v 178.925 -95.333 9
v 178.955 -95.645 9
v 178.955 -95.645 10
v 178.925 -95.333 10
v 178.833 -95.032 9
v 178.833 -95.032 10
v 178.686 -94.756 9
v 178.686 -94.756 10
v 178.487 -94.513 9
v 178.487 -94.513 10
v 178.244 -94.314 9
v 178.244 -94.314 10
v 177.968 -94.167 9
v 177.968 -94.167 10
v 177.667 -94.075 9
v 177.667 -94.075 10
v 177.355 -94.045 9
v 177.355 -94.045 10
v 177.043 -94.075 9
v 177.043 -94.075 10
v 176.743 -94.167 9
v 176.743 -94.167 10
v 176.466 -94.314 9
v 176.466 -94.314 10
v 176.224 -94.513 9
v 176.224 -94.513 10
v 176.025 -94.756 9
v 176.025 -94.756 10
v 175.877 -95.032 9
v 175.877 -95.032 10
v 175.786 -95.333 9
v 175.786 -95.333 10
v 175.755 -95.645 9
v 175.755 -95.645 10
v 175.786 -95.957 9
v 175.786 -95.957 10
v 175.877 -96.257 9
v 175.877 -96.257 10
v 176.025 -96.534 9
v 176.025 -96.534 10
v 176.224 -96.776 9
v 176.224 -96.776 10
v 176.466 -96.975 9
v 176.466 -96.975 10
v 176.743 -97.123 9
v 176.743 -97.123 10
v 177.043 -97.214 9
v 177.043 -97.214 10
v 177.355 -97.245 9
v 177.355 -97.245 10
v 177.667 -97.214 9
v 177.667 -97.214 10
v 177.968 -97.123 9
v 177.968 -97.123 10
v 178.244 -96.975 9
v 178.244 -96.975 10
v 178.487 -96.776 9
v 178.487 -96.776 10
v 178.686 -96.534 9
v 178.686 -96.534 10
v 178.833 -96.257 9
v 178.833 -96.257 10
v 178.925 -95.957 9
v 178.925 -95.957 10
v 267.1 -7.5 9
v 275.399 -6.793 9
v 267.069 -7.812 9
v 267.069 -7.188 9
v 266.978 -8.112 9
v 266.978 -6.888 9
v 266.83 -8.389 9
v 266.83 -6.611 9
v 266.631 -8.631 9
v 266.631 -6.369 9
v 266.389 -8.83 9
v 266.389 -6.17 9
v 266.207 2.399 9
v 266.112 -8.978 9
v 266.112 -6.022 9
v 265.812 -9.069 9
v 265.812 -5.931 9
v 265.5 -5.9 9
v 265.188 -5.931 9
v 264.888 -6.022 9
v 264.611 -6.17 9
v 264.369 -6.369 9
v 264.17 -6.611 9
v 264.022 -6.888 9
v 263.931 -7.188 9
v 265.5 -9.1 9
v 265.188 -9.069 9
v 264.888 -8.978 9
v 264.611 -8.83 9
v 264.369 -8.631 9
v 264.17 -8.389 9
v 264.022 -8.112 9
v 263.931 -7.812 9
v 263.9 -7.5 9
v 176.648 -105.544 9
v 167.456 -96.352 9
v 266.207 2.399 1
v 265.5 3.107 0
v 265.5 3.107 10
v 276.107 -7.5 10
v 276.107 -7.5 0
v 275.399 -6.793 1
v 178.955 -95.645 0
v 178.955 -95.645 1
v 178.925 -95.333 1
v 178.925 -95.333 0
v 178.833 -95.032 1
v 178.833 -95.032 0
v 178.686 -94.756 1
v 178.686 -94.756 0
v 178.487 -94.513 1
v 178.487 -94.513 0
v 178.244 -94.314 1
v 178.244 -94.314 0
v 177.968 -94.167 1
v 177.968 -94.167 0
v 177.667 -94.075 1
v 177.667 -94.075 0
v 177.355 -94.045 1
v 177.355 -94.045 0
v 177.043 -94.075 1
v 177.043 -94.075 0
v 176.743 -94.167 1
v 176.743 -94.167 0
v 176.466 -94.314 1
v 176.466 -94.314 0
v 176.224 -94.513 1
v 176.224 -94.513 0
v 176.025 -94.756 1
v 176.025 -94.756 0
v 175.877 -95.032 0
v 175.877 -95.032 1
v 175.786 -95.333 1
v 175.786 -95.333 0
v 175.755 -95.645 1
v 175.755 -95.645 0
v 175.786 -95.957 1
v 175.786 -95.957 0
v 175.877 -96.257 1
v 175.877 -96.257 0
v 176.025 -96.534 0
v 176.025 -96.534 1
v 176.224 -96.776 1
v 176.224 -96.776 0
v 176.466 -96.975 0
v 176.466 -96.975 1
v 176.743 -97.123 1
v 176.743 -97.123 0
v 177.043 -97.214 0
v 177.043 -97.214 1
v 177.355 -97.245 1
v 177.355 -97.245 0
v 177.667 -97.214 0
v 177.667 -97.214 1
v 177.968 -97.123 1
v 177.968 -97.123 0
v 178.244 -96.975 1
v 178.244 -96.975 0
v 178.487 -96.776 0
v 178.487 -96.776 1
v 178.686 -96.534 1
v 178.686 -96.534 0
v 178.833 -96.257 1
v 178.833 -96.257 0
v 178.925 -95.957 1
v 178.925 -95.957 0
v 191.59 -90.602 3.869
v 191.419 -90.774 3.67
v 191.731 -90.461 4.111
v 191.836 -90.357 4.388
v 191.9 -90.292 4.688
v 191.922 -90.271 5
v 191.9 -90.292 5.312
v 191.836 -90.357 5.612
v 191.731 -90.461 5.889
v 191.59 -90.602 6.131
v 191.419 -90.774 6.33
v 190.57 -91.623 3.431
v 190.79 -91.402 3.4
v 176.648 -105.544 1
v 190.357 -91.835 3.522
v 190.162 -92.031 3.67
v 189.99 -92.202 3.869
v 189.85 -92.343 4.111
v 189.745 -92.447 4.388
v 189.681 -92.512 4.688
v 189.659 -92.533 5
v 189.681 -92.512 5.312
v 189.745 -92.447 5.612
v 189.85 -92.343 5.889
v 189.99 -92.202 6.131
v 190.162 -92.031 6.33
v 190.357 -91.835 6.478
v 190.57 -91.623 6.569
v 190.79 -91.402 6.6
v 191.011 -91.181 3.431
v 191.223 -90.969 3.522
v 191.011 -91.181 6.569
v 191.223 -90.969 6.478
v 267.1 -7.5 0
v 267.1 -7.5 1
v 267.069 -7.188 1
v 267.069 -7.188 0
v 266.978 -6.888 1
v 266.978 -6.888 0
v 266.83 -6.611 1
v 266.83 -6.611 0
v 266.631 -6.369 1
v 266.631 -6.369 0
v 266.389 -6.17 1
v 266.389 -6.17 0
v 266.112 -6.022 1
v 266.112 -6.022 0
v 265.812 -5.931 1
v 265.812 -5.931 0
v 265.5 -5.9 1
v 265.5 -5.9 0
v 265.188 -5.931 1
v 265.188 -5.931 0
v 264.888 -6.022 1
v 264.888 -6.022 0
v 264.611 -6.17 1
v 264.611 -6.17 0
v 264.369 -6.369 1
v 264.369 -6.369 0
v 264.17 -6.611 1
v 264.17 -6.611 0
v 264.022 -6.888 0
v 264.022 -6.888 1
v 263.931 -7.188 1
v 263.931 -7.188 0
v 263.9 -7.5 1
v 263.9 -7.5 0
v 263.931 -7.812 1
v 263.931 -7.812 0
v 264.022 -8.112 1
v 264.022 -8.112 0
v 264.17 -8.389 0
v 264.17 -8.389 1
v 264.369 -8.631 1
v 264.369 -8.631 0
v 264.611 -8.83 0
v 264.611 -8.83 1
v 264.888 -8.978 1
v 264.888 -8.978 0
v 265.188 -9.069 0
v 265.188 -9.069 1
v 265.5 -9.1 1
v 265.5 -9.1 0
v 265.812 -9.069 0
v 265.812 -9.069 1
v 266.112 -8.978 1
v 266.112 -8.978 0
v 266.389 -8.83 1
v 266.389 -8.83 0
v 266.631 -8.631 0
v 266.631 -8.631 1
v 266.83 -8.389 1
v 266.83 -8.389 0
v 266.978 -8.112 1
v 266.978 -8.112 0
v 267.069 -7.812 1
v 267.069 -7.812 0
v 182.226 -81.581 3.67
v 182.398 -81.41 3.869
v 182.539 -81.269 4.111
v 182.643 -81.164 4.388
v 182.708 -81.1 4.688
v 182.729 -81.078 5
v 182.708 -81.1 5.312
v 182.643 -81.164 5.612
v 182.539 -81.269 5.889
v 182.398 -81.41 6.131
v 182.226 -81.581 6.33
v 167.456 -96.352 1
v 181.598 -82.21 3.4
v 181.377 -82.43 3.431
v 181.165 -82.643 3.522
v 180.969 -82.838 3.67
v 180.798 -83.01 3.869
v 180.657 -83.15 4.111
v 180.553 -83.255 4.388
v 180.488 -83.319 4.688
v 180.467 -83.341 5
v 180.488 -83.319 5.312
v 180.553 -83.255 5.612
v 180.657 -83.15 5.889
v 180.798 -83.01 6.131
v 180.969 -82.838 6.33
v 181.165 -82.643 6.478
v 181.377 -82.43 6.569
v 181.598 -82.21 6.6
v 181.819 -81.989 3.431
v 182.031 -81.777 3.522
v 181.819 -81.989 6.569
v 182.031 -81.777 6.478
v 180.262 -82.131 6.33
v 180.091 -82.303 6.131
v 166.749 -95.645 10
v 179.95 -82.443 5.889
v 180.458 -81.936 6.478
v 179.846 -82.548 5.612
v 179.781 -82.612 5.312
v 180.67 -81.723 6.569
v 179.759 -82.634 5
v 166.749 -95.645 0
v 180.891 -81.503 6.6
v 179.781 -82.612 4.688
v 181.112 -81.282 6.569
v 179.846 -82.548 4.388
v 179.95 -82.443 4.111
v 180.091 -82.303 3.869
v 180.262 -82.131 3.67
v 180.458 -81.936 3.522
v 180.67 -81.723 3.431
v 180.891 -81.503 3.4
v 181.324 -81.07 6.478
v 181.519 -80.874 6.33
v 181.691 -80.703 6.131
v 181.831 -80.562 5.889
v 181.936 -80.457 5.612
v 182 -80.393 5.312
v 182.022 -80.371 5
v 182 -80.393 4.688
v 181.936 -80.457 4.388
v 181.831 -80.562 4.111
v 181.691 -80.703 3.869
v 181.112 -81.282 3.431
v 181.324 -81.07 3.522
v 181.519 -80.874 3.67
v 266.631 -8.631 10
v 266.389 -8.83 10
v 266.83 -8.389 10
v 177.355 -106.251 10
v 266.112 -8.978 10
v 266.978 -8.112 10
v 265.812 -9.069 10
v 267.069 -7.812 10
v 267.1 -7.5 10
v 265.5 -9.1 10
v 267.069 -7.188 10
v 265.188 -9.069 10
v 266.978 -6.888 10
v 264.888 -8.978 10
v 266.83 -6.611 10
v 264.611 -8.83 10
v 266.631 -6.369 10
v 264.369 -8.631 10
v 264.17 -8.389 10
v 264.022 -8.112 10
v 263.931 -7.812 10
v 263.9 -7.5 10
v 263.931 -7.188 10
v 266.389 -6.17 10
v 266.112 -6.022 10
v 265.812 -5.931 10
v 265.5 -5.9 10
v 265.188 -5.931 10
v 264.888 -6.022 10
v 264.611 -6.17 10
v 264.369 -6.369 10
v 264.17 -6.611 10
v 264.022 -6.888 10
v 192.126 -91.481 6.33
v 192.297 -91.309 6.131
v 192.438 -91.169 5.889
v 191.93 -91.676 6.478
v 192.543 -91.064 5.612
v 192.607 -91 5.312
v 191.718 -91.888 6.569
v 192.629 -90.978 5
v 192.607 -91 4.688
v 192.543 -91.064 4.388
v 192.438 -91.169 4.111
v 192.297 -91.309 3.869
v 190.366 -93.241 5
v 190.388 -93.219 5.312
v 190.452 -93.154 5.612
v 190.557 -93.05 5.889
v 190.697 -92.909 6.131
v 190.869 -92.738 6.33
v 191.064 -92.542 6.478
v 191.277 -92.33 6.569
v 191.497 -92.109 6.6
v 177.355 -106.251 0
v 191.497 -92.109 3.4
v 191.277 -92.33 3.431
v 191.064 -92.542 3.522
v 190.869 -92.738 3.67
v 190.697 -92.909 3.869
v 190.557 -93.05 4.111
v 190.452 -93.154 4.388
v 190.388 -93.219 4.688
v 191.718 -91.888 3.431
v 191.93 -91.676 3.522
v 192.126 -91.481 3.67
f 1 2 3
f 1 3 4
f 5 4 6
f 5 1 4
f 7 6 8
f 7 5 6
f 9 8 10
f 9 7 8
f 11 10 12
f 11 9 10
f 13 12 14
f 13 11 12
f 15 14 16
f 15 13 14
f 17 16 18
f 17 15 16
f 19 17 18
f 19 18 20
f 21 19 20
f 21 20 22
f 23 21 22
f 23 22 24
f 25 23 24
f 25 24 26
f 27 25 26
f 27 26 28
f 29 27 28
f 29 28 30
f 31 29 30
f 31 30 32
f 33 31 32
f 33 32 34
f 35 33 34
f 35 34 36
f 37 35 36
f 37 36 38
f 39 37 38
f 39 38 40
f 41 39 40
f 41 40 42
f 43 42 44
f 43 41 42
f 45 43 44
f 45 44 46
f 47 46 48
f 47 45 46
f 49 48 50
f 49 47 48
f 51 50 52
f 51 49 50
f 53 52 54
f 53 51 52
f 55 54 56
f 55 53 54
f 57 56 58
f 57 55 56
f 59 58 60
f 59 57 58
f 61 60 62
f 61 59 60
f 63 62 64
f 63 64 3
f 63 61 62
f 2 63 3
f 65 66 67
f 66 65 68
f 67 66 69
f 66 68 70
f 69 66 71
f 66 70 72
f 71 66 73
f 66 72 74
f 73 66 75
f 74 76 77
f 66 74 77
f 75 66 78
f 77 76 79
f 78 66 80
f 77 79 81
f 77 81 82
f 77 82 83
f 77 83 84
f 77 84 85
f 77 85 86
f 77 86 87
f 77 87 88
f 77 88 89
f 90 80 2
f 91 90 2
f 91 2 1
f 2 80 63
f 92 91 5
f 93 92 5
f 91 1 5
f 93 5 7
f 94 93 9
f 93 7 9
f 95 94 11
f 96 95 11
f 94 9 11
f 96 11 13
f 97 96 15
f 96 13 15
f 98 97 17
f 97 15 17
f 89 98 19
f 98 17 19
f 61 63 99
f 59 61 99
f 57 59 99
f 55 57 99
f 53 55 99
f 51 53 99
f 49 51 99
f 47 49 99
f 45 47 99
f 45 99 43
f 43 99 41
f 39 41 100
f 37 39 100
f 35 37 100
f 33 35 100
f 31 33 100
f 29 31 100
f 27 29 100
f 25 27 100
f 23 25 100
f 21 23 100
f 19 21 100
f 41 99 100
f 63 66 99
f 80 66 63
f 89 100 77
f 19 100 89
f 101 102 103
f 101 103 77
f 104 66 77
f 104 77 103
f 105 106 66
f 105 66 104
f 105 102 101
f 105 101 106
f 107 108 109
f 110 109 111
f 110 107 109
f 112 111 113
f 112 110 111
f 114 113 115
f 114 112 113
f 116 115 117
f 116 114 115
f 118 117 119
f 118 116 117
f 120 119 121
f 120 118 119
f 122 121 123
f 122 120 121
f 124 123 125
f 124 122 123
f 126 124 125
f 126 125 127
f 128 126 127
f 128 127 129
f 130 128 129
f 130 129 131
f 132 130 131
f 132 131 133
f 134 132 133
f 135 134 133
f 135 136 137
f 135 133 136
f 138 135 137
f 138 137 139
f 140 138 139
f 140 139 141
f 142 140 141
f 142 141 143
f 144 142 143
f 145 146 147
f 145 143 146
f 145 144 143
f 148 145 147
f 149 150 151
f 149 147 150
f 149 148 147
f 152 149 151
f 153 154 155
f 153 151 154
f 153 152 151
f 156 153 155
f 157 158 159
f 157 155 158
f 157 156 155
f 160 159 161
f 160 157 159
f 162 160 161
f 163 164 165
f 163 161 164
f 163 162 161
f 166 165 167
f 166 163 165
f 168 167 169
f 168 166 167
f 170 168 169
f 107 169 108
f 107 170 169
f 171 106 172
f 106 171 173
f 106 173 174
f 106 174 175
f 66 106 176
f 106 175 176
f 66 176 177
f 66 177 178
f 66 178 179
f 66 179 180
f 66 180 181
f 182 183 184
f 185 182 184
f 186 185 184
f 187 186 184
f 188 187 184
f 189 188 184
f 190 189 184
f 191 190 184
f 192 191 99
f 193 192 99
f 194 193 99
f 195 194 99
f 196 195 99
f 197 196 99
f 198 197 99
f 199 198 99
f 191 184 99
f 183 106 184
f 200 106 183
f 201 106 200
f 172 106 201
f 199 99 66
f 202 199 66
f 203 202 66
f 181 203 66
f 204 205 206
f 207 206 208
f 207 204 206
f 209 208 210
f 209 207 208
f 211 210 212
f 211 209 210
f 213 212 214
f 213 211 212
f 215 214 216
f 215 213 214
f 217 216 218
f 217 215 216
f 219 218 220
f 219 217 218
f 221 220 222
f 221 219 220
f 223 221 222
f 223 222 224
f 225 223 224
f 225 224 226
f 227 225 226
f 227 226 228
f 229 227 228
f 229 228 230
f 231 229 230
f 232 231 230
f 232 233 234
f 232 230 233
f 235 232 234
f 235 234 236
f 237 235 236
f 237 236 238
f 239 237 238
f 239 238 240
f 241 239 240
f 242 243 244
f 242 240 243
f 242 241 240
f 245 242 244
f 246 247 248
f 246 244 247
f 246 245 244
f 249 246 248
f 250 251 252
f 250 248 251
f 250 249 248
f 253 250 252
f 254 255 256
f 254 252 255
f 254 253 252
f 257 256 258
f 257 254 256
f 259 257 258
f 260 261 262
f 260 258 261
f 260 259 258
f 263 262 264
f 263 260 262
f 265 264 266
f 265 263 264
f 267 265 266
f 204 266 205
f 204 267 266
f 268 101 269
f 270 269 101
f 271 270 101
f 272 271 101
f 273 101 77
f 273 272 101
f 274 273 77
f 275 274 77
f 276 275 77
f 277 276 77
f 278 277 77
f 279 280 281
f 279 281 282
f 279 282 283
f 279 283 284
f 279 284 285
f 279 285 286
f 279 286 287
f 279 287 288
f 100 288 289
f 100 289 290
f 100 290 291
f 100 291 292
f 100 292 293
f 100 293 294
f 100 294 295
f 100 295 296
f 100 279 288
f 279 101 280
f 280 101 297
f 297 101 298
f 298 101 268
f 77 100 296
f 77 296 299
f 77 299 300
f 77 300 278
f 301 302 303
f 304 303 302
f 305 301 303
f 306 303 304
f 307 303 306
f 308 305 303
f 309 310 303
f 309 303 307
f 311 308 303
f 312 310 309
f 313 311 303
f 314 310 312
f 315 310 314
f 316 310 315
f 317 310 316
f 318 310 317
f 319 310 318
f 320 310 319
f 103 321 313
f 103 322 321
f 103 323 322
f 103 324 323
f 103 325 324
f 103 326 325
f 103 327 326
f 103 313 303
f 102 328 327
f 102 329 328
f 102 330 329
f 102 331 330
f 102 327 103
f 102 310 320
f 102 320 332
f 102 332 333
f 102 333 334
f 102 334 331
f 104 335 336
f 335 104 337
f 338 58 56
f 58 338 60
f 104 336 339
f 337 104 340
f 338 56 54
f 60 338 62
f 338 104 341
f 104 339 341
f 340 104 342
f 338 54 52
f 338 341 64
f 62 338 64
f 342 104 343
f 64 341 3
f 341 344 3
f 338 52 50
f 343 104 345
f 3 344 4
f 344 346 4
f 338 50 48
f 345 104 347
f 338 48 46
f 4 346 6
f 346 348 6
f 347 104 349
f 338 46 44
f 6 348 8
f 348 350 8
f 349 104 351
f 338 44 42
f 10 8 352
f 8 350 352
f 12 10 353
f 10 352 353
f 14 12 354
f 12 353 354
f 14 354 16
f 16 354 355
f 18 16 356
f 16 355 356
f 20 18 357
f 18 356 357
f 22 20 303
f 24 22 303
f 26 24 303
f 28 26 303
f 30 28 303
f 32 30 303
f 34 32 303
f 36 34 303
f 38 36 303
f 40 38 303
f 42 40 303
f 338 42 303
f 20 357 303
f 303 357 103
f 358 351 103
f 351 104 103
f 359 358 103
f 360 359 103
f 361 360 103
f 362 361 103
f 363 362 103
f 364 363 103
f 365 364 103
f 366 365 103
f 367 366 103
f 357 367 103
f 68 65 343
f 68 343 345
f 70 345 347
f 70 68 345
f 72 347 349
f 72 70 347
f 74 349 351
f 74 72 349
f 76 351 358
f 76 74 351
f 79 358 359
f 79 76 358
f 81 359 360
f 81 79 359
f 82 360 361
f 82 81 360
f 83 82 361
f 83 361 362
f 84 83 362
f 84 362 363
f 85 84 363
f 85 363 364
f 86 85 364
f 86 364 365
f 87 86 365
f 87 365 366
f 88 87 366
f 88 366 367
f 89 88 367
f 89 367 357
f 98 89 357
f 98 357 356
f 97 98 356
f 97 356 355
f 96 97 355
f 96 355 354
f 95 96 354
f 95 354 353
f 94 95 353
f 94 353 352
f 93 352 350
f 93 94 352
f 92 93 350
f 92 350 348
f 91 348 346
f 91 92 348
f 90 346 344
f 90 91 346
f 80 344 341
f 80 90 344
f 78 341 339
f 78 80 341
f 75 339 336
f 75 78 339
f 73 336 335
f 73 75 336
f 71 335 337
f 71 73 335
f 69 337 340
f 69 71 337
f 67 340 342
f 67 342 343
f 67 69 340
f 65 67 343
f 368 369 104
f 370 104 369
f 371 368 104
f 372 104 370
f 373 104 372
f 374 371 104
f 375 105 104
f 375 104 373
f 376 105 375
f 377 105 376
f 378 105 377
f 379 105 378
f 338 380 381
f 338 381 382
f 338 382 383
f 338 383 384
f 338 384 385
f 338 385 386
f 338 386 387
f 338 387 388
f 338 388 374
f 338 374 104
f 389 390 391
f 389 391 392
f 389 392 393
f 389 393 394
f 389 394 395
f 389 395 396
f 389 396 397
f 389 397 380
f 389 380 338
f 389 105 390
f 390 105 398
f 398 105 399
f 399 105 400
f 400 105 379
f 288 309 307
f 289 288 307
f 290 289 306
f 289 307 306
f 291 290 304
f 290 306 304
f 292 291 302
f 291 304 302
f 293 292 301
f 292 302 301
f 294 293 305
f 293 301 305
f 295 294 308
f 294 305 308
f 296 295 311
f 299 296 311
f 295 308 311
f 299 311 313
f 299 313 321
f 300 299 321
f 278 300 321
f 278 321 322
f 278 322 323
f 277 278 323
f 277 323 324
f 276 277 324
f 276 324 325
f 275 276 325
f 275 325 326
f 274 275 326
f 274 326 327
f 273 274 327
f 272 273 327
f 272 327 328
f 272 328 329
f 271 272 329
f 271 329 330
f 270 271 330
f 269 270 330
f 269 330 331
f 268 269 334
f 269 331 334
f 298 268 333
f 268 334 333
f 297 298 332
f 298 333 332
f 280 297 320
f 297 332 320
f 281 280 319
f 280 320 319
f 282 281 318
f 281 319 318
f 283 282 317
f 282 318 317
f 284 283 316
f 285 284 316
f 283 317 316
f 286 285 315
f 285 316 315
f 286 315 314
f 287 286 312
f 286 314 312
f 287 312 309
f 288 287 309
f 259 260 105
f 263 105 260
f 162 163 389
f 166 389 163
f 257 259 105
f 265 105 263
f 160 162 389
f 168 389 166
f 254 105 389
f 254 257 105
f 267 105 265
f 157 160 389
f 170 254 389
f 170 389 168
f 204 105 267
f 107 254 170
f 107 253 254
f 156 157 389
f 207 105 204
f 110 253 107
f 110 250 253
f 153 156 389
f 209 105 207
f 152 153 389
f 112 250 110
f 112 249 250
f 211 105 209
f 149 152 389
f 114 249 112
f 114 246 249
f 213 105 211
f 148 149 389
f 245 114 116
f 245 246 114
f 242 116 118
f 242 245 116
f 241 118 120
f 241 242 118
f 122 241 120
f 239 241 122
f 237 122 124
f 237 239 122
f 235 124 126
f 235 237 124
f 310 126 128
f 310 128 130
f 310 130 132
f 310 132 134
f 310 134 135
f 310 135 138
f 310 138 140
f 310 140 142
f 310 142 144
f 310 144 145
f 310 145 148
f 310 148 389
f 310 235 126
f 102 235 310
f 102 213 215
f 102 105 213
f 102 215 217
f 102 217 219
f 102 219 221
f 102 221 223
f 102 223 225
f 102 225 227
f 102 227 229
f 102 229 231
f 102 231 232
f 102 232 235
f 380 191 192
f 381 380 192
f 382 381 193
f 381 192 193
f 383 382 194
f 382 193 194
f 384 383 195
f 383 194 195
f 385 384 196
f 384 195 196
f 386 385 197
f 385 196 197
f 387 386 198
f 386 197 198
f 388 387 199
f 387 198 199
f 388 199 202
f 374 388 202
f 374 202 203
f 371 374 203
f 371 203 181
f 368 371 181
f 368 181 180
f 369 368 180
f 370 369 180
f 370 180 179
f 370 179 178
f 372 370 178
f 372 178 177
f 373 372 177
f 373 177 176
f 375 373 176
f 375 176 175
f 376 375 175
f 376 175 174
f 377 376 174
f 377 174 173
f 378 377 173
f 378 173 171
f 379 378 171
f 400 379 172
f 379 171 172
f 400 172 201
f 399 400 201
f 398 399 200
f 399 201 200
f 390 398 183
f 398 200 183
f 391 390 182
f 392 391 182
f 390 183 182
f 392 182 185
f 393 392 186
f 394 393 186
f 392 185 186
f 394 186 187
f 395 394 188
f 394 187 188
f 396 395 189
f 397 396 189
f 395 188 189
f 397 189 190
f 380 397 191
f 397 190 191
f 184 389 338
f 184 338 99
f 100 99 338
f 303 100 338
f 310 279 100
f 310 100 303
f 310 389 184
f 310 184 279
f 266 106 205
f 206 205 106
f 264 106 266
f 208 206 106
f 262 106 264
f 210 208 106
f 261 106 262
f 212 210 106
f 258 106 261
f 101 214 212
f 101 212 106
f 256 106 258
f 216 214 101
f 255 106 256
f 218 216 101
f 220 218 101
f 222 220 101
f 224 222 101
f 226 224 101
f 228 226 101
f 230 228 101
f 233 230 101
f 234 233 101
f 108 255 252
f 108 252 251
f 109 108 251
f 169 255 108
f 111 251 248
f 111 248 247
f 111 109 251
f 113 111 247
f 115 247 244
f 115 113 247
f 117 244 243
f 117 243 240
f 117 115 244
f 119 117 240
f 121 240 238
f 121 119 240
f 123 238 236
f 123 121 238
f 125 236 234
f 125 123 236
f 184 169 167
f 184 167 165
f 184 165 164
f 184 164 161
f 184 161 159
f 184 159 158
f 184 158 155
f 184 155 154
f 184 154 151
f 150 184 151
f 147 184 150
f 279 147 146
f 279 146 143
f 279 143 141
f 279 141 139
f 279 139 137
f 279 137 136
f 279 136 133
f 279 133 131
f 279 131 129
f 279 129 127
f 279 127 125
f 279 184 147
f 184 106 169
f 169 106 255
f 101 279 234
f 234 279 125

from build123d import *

# Parameters (mm, degrees)
SKETCH_1_R          = 1.6
EXTRUDE_1_DEPTH     = 10
SKETCH_2_R          = 1.6
CUT_EXTRUDE_1_DEPTH = 20
SKETCH_3_W          = 8
SKETCH_3_H          = 13
CUT_EXTRUDE_2_DEPTH = 1000


with BuildPart() as part:
    # ｽｹｯﾁ1 → ﾎﾞｽ - 押し出し1 (new body)
    with BuildSketch(Plane.XY):
        Polygon((177.355249325, -106.251352393), (166.748647607, -95.644750675), (265.5, 3.106601718), (276.106601718, -7.5), align=None)
        with Locations((265.5, -7.5)):
            Circle(SKETCH_1_R, mode=Mode.SUBTRACT)
        with Locations((177.355249325, -95.644750675)):
            Circle(SKETCH_1_R, mode=Mode.SUBTRACT)
    extrude(amount=EXTRUDE_1_DEPTH)

    # ｽｹｯﾁ2 → ｶｯﾄ - 押し出し1 (cut)
    with BuildSketch(Plane(origin=(131.196699141, -131.196699141, 0), x_dir=(0.7071067811865585, 0.7071067811865366, 0), z_dir=(-0.7071067811865366, 0.7071067811865585, 0))):
        with Locations(Location((70.278047689, -5, 0), (0, 0, 180))):
            Circle(SKETCH_2_R)
    extrude(amount=-CUT_EXTRUDE_1_DEPTH, mode=Mode.SUBTRACT)

    # ｽｹｯﾁ3 → ｶｯﾄ - 押し出し2 (cut)
    with BuildSketch(Plane(origin=(35.551948466, 35.551948466, 0), x_dir=(0, 0, 1), z_dir=(-0.7071067811865581, -0.7071067811865369, 0))):
        with Locations((5, -193.040151264)):
            Rectangle(SKETCH_3_W, SKETCH_3_H)
    extrude(amount=-CUT_EXTRUDE_2_DEPTH, mode=Mode.SUBTRACT)


solid = part.part
